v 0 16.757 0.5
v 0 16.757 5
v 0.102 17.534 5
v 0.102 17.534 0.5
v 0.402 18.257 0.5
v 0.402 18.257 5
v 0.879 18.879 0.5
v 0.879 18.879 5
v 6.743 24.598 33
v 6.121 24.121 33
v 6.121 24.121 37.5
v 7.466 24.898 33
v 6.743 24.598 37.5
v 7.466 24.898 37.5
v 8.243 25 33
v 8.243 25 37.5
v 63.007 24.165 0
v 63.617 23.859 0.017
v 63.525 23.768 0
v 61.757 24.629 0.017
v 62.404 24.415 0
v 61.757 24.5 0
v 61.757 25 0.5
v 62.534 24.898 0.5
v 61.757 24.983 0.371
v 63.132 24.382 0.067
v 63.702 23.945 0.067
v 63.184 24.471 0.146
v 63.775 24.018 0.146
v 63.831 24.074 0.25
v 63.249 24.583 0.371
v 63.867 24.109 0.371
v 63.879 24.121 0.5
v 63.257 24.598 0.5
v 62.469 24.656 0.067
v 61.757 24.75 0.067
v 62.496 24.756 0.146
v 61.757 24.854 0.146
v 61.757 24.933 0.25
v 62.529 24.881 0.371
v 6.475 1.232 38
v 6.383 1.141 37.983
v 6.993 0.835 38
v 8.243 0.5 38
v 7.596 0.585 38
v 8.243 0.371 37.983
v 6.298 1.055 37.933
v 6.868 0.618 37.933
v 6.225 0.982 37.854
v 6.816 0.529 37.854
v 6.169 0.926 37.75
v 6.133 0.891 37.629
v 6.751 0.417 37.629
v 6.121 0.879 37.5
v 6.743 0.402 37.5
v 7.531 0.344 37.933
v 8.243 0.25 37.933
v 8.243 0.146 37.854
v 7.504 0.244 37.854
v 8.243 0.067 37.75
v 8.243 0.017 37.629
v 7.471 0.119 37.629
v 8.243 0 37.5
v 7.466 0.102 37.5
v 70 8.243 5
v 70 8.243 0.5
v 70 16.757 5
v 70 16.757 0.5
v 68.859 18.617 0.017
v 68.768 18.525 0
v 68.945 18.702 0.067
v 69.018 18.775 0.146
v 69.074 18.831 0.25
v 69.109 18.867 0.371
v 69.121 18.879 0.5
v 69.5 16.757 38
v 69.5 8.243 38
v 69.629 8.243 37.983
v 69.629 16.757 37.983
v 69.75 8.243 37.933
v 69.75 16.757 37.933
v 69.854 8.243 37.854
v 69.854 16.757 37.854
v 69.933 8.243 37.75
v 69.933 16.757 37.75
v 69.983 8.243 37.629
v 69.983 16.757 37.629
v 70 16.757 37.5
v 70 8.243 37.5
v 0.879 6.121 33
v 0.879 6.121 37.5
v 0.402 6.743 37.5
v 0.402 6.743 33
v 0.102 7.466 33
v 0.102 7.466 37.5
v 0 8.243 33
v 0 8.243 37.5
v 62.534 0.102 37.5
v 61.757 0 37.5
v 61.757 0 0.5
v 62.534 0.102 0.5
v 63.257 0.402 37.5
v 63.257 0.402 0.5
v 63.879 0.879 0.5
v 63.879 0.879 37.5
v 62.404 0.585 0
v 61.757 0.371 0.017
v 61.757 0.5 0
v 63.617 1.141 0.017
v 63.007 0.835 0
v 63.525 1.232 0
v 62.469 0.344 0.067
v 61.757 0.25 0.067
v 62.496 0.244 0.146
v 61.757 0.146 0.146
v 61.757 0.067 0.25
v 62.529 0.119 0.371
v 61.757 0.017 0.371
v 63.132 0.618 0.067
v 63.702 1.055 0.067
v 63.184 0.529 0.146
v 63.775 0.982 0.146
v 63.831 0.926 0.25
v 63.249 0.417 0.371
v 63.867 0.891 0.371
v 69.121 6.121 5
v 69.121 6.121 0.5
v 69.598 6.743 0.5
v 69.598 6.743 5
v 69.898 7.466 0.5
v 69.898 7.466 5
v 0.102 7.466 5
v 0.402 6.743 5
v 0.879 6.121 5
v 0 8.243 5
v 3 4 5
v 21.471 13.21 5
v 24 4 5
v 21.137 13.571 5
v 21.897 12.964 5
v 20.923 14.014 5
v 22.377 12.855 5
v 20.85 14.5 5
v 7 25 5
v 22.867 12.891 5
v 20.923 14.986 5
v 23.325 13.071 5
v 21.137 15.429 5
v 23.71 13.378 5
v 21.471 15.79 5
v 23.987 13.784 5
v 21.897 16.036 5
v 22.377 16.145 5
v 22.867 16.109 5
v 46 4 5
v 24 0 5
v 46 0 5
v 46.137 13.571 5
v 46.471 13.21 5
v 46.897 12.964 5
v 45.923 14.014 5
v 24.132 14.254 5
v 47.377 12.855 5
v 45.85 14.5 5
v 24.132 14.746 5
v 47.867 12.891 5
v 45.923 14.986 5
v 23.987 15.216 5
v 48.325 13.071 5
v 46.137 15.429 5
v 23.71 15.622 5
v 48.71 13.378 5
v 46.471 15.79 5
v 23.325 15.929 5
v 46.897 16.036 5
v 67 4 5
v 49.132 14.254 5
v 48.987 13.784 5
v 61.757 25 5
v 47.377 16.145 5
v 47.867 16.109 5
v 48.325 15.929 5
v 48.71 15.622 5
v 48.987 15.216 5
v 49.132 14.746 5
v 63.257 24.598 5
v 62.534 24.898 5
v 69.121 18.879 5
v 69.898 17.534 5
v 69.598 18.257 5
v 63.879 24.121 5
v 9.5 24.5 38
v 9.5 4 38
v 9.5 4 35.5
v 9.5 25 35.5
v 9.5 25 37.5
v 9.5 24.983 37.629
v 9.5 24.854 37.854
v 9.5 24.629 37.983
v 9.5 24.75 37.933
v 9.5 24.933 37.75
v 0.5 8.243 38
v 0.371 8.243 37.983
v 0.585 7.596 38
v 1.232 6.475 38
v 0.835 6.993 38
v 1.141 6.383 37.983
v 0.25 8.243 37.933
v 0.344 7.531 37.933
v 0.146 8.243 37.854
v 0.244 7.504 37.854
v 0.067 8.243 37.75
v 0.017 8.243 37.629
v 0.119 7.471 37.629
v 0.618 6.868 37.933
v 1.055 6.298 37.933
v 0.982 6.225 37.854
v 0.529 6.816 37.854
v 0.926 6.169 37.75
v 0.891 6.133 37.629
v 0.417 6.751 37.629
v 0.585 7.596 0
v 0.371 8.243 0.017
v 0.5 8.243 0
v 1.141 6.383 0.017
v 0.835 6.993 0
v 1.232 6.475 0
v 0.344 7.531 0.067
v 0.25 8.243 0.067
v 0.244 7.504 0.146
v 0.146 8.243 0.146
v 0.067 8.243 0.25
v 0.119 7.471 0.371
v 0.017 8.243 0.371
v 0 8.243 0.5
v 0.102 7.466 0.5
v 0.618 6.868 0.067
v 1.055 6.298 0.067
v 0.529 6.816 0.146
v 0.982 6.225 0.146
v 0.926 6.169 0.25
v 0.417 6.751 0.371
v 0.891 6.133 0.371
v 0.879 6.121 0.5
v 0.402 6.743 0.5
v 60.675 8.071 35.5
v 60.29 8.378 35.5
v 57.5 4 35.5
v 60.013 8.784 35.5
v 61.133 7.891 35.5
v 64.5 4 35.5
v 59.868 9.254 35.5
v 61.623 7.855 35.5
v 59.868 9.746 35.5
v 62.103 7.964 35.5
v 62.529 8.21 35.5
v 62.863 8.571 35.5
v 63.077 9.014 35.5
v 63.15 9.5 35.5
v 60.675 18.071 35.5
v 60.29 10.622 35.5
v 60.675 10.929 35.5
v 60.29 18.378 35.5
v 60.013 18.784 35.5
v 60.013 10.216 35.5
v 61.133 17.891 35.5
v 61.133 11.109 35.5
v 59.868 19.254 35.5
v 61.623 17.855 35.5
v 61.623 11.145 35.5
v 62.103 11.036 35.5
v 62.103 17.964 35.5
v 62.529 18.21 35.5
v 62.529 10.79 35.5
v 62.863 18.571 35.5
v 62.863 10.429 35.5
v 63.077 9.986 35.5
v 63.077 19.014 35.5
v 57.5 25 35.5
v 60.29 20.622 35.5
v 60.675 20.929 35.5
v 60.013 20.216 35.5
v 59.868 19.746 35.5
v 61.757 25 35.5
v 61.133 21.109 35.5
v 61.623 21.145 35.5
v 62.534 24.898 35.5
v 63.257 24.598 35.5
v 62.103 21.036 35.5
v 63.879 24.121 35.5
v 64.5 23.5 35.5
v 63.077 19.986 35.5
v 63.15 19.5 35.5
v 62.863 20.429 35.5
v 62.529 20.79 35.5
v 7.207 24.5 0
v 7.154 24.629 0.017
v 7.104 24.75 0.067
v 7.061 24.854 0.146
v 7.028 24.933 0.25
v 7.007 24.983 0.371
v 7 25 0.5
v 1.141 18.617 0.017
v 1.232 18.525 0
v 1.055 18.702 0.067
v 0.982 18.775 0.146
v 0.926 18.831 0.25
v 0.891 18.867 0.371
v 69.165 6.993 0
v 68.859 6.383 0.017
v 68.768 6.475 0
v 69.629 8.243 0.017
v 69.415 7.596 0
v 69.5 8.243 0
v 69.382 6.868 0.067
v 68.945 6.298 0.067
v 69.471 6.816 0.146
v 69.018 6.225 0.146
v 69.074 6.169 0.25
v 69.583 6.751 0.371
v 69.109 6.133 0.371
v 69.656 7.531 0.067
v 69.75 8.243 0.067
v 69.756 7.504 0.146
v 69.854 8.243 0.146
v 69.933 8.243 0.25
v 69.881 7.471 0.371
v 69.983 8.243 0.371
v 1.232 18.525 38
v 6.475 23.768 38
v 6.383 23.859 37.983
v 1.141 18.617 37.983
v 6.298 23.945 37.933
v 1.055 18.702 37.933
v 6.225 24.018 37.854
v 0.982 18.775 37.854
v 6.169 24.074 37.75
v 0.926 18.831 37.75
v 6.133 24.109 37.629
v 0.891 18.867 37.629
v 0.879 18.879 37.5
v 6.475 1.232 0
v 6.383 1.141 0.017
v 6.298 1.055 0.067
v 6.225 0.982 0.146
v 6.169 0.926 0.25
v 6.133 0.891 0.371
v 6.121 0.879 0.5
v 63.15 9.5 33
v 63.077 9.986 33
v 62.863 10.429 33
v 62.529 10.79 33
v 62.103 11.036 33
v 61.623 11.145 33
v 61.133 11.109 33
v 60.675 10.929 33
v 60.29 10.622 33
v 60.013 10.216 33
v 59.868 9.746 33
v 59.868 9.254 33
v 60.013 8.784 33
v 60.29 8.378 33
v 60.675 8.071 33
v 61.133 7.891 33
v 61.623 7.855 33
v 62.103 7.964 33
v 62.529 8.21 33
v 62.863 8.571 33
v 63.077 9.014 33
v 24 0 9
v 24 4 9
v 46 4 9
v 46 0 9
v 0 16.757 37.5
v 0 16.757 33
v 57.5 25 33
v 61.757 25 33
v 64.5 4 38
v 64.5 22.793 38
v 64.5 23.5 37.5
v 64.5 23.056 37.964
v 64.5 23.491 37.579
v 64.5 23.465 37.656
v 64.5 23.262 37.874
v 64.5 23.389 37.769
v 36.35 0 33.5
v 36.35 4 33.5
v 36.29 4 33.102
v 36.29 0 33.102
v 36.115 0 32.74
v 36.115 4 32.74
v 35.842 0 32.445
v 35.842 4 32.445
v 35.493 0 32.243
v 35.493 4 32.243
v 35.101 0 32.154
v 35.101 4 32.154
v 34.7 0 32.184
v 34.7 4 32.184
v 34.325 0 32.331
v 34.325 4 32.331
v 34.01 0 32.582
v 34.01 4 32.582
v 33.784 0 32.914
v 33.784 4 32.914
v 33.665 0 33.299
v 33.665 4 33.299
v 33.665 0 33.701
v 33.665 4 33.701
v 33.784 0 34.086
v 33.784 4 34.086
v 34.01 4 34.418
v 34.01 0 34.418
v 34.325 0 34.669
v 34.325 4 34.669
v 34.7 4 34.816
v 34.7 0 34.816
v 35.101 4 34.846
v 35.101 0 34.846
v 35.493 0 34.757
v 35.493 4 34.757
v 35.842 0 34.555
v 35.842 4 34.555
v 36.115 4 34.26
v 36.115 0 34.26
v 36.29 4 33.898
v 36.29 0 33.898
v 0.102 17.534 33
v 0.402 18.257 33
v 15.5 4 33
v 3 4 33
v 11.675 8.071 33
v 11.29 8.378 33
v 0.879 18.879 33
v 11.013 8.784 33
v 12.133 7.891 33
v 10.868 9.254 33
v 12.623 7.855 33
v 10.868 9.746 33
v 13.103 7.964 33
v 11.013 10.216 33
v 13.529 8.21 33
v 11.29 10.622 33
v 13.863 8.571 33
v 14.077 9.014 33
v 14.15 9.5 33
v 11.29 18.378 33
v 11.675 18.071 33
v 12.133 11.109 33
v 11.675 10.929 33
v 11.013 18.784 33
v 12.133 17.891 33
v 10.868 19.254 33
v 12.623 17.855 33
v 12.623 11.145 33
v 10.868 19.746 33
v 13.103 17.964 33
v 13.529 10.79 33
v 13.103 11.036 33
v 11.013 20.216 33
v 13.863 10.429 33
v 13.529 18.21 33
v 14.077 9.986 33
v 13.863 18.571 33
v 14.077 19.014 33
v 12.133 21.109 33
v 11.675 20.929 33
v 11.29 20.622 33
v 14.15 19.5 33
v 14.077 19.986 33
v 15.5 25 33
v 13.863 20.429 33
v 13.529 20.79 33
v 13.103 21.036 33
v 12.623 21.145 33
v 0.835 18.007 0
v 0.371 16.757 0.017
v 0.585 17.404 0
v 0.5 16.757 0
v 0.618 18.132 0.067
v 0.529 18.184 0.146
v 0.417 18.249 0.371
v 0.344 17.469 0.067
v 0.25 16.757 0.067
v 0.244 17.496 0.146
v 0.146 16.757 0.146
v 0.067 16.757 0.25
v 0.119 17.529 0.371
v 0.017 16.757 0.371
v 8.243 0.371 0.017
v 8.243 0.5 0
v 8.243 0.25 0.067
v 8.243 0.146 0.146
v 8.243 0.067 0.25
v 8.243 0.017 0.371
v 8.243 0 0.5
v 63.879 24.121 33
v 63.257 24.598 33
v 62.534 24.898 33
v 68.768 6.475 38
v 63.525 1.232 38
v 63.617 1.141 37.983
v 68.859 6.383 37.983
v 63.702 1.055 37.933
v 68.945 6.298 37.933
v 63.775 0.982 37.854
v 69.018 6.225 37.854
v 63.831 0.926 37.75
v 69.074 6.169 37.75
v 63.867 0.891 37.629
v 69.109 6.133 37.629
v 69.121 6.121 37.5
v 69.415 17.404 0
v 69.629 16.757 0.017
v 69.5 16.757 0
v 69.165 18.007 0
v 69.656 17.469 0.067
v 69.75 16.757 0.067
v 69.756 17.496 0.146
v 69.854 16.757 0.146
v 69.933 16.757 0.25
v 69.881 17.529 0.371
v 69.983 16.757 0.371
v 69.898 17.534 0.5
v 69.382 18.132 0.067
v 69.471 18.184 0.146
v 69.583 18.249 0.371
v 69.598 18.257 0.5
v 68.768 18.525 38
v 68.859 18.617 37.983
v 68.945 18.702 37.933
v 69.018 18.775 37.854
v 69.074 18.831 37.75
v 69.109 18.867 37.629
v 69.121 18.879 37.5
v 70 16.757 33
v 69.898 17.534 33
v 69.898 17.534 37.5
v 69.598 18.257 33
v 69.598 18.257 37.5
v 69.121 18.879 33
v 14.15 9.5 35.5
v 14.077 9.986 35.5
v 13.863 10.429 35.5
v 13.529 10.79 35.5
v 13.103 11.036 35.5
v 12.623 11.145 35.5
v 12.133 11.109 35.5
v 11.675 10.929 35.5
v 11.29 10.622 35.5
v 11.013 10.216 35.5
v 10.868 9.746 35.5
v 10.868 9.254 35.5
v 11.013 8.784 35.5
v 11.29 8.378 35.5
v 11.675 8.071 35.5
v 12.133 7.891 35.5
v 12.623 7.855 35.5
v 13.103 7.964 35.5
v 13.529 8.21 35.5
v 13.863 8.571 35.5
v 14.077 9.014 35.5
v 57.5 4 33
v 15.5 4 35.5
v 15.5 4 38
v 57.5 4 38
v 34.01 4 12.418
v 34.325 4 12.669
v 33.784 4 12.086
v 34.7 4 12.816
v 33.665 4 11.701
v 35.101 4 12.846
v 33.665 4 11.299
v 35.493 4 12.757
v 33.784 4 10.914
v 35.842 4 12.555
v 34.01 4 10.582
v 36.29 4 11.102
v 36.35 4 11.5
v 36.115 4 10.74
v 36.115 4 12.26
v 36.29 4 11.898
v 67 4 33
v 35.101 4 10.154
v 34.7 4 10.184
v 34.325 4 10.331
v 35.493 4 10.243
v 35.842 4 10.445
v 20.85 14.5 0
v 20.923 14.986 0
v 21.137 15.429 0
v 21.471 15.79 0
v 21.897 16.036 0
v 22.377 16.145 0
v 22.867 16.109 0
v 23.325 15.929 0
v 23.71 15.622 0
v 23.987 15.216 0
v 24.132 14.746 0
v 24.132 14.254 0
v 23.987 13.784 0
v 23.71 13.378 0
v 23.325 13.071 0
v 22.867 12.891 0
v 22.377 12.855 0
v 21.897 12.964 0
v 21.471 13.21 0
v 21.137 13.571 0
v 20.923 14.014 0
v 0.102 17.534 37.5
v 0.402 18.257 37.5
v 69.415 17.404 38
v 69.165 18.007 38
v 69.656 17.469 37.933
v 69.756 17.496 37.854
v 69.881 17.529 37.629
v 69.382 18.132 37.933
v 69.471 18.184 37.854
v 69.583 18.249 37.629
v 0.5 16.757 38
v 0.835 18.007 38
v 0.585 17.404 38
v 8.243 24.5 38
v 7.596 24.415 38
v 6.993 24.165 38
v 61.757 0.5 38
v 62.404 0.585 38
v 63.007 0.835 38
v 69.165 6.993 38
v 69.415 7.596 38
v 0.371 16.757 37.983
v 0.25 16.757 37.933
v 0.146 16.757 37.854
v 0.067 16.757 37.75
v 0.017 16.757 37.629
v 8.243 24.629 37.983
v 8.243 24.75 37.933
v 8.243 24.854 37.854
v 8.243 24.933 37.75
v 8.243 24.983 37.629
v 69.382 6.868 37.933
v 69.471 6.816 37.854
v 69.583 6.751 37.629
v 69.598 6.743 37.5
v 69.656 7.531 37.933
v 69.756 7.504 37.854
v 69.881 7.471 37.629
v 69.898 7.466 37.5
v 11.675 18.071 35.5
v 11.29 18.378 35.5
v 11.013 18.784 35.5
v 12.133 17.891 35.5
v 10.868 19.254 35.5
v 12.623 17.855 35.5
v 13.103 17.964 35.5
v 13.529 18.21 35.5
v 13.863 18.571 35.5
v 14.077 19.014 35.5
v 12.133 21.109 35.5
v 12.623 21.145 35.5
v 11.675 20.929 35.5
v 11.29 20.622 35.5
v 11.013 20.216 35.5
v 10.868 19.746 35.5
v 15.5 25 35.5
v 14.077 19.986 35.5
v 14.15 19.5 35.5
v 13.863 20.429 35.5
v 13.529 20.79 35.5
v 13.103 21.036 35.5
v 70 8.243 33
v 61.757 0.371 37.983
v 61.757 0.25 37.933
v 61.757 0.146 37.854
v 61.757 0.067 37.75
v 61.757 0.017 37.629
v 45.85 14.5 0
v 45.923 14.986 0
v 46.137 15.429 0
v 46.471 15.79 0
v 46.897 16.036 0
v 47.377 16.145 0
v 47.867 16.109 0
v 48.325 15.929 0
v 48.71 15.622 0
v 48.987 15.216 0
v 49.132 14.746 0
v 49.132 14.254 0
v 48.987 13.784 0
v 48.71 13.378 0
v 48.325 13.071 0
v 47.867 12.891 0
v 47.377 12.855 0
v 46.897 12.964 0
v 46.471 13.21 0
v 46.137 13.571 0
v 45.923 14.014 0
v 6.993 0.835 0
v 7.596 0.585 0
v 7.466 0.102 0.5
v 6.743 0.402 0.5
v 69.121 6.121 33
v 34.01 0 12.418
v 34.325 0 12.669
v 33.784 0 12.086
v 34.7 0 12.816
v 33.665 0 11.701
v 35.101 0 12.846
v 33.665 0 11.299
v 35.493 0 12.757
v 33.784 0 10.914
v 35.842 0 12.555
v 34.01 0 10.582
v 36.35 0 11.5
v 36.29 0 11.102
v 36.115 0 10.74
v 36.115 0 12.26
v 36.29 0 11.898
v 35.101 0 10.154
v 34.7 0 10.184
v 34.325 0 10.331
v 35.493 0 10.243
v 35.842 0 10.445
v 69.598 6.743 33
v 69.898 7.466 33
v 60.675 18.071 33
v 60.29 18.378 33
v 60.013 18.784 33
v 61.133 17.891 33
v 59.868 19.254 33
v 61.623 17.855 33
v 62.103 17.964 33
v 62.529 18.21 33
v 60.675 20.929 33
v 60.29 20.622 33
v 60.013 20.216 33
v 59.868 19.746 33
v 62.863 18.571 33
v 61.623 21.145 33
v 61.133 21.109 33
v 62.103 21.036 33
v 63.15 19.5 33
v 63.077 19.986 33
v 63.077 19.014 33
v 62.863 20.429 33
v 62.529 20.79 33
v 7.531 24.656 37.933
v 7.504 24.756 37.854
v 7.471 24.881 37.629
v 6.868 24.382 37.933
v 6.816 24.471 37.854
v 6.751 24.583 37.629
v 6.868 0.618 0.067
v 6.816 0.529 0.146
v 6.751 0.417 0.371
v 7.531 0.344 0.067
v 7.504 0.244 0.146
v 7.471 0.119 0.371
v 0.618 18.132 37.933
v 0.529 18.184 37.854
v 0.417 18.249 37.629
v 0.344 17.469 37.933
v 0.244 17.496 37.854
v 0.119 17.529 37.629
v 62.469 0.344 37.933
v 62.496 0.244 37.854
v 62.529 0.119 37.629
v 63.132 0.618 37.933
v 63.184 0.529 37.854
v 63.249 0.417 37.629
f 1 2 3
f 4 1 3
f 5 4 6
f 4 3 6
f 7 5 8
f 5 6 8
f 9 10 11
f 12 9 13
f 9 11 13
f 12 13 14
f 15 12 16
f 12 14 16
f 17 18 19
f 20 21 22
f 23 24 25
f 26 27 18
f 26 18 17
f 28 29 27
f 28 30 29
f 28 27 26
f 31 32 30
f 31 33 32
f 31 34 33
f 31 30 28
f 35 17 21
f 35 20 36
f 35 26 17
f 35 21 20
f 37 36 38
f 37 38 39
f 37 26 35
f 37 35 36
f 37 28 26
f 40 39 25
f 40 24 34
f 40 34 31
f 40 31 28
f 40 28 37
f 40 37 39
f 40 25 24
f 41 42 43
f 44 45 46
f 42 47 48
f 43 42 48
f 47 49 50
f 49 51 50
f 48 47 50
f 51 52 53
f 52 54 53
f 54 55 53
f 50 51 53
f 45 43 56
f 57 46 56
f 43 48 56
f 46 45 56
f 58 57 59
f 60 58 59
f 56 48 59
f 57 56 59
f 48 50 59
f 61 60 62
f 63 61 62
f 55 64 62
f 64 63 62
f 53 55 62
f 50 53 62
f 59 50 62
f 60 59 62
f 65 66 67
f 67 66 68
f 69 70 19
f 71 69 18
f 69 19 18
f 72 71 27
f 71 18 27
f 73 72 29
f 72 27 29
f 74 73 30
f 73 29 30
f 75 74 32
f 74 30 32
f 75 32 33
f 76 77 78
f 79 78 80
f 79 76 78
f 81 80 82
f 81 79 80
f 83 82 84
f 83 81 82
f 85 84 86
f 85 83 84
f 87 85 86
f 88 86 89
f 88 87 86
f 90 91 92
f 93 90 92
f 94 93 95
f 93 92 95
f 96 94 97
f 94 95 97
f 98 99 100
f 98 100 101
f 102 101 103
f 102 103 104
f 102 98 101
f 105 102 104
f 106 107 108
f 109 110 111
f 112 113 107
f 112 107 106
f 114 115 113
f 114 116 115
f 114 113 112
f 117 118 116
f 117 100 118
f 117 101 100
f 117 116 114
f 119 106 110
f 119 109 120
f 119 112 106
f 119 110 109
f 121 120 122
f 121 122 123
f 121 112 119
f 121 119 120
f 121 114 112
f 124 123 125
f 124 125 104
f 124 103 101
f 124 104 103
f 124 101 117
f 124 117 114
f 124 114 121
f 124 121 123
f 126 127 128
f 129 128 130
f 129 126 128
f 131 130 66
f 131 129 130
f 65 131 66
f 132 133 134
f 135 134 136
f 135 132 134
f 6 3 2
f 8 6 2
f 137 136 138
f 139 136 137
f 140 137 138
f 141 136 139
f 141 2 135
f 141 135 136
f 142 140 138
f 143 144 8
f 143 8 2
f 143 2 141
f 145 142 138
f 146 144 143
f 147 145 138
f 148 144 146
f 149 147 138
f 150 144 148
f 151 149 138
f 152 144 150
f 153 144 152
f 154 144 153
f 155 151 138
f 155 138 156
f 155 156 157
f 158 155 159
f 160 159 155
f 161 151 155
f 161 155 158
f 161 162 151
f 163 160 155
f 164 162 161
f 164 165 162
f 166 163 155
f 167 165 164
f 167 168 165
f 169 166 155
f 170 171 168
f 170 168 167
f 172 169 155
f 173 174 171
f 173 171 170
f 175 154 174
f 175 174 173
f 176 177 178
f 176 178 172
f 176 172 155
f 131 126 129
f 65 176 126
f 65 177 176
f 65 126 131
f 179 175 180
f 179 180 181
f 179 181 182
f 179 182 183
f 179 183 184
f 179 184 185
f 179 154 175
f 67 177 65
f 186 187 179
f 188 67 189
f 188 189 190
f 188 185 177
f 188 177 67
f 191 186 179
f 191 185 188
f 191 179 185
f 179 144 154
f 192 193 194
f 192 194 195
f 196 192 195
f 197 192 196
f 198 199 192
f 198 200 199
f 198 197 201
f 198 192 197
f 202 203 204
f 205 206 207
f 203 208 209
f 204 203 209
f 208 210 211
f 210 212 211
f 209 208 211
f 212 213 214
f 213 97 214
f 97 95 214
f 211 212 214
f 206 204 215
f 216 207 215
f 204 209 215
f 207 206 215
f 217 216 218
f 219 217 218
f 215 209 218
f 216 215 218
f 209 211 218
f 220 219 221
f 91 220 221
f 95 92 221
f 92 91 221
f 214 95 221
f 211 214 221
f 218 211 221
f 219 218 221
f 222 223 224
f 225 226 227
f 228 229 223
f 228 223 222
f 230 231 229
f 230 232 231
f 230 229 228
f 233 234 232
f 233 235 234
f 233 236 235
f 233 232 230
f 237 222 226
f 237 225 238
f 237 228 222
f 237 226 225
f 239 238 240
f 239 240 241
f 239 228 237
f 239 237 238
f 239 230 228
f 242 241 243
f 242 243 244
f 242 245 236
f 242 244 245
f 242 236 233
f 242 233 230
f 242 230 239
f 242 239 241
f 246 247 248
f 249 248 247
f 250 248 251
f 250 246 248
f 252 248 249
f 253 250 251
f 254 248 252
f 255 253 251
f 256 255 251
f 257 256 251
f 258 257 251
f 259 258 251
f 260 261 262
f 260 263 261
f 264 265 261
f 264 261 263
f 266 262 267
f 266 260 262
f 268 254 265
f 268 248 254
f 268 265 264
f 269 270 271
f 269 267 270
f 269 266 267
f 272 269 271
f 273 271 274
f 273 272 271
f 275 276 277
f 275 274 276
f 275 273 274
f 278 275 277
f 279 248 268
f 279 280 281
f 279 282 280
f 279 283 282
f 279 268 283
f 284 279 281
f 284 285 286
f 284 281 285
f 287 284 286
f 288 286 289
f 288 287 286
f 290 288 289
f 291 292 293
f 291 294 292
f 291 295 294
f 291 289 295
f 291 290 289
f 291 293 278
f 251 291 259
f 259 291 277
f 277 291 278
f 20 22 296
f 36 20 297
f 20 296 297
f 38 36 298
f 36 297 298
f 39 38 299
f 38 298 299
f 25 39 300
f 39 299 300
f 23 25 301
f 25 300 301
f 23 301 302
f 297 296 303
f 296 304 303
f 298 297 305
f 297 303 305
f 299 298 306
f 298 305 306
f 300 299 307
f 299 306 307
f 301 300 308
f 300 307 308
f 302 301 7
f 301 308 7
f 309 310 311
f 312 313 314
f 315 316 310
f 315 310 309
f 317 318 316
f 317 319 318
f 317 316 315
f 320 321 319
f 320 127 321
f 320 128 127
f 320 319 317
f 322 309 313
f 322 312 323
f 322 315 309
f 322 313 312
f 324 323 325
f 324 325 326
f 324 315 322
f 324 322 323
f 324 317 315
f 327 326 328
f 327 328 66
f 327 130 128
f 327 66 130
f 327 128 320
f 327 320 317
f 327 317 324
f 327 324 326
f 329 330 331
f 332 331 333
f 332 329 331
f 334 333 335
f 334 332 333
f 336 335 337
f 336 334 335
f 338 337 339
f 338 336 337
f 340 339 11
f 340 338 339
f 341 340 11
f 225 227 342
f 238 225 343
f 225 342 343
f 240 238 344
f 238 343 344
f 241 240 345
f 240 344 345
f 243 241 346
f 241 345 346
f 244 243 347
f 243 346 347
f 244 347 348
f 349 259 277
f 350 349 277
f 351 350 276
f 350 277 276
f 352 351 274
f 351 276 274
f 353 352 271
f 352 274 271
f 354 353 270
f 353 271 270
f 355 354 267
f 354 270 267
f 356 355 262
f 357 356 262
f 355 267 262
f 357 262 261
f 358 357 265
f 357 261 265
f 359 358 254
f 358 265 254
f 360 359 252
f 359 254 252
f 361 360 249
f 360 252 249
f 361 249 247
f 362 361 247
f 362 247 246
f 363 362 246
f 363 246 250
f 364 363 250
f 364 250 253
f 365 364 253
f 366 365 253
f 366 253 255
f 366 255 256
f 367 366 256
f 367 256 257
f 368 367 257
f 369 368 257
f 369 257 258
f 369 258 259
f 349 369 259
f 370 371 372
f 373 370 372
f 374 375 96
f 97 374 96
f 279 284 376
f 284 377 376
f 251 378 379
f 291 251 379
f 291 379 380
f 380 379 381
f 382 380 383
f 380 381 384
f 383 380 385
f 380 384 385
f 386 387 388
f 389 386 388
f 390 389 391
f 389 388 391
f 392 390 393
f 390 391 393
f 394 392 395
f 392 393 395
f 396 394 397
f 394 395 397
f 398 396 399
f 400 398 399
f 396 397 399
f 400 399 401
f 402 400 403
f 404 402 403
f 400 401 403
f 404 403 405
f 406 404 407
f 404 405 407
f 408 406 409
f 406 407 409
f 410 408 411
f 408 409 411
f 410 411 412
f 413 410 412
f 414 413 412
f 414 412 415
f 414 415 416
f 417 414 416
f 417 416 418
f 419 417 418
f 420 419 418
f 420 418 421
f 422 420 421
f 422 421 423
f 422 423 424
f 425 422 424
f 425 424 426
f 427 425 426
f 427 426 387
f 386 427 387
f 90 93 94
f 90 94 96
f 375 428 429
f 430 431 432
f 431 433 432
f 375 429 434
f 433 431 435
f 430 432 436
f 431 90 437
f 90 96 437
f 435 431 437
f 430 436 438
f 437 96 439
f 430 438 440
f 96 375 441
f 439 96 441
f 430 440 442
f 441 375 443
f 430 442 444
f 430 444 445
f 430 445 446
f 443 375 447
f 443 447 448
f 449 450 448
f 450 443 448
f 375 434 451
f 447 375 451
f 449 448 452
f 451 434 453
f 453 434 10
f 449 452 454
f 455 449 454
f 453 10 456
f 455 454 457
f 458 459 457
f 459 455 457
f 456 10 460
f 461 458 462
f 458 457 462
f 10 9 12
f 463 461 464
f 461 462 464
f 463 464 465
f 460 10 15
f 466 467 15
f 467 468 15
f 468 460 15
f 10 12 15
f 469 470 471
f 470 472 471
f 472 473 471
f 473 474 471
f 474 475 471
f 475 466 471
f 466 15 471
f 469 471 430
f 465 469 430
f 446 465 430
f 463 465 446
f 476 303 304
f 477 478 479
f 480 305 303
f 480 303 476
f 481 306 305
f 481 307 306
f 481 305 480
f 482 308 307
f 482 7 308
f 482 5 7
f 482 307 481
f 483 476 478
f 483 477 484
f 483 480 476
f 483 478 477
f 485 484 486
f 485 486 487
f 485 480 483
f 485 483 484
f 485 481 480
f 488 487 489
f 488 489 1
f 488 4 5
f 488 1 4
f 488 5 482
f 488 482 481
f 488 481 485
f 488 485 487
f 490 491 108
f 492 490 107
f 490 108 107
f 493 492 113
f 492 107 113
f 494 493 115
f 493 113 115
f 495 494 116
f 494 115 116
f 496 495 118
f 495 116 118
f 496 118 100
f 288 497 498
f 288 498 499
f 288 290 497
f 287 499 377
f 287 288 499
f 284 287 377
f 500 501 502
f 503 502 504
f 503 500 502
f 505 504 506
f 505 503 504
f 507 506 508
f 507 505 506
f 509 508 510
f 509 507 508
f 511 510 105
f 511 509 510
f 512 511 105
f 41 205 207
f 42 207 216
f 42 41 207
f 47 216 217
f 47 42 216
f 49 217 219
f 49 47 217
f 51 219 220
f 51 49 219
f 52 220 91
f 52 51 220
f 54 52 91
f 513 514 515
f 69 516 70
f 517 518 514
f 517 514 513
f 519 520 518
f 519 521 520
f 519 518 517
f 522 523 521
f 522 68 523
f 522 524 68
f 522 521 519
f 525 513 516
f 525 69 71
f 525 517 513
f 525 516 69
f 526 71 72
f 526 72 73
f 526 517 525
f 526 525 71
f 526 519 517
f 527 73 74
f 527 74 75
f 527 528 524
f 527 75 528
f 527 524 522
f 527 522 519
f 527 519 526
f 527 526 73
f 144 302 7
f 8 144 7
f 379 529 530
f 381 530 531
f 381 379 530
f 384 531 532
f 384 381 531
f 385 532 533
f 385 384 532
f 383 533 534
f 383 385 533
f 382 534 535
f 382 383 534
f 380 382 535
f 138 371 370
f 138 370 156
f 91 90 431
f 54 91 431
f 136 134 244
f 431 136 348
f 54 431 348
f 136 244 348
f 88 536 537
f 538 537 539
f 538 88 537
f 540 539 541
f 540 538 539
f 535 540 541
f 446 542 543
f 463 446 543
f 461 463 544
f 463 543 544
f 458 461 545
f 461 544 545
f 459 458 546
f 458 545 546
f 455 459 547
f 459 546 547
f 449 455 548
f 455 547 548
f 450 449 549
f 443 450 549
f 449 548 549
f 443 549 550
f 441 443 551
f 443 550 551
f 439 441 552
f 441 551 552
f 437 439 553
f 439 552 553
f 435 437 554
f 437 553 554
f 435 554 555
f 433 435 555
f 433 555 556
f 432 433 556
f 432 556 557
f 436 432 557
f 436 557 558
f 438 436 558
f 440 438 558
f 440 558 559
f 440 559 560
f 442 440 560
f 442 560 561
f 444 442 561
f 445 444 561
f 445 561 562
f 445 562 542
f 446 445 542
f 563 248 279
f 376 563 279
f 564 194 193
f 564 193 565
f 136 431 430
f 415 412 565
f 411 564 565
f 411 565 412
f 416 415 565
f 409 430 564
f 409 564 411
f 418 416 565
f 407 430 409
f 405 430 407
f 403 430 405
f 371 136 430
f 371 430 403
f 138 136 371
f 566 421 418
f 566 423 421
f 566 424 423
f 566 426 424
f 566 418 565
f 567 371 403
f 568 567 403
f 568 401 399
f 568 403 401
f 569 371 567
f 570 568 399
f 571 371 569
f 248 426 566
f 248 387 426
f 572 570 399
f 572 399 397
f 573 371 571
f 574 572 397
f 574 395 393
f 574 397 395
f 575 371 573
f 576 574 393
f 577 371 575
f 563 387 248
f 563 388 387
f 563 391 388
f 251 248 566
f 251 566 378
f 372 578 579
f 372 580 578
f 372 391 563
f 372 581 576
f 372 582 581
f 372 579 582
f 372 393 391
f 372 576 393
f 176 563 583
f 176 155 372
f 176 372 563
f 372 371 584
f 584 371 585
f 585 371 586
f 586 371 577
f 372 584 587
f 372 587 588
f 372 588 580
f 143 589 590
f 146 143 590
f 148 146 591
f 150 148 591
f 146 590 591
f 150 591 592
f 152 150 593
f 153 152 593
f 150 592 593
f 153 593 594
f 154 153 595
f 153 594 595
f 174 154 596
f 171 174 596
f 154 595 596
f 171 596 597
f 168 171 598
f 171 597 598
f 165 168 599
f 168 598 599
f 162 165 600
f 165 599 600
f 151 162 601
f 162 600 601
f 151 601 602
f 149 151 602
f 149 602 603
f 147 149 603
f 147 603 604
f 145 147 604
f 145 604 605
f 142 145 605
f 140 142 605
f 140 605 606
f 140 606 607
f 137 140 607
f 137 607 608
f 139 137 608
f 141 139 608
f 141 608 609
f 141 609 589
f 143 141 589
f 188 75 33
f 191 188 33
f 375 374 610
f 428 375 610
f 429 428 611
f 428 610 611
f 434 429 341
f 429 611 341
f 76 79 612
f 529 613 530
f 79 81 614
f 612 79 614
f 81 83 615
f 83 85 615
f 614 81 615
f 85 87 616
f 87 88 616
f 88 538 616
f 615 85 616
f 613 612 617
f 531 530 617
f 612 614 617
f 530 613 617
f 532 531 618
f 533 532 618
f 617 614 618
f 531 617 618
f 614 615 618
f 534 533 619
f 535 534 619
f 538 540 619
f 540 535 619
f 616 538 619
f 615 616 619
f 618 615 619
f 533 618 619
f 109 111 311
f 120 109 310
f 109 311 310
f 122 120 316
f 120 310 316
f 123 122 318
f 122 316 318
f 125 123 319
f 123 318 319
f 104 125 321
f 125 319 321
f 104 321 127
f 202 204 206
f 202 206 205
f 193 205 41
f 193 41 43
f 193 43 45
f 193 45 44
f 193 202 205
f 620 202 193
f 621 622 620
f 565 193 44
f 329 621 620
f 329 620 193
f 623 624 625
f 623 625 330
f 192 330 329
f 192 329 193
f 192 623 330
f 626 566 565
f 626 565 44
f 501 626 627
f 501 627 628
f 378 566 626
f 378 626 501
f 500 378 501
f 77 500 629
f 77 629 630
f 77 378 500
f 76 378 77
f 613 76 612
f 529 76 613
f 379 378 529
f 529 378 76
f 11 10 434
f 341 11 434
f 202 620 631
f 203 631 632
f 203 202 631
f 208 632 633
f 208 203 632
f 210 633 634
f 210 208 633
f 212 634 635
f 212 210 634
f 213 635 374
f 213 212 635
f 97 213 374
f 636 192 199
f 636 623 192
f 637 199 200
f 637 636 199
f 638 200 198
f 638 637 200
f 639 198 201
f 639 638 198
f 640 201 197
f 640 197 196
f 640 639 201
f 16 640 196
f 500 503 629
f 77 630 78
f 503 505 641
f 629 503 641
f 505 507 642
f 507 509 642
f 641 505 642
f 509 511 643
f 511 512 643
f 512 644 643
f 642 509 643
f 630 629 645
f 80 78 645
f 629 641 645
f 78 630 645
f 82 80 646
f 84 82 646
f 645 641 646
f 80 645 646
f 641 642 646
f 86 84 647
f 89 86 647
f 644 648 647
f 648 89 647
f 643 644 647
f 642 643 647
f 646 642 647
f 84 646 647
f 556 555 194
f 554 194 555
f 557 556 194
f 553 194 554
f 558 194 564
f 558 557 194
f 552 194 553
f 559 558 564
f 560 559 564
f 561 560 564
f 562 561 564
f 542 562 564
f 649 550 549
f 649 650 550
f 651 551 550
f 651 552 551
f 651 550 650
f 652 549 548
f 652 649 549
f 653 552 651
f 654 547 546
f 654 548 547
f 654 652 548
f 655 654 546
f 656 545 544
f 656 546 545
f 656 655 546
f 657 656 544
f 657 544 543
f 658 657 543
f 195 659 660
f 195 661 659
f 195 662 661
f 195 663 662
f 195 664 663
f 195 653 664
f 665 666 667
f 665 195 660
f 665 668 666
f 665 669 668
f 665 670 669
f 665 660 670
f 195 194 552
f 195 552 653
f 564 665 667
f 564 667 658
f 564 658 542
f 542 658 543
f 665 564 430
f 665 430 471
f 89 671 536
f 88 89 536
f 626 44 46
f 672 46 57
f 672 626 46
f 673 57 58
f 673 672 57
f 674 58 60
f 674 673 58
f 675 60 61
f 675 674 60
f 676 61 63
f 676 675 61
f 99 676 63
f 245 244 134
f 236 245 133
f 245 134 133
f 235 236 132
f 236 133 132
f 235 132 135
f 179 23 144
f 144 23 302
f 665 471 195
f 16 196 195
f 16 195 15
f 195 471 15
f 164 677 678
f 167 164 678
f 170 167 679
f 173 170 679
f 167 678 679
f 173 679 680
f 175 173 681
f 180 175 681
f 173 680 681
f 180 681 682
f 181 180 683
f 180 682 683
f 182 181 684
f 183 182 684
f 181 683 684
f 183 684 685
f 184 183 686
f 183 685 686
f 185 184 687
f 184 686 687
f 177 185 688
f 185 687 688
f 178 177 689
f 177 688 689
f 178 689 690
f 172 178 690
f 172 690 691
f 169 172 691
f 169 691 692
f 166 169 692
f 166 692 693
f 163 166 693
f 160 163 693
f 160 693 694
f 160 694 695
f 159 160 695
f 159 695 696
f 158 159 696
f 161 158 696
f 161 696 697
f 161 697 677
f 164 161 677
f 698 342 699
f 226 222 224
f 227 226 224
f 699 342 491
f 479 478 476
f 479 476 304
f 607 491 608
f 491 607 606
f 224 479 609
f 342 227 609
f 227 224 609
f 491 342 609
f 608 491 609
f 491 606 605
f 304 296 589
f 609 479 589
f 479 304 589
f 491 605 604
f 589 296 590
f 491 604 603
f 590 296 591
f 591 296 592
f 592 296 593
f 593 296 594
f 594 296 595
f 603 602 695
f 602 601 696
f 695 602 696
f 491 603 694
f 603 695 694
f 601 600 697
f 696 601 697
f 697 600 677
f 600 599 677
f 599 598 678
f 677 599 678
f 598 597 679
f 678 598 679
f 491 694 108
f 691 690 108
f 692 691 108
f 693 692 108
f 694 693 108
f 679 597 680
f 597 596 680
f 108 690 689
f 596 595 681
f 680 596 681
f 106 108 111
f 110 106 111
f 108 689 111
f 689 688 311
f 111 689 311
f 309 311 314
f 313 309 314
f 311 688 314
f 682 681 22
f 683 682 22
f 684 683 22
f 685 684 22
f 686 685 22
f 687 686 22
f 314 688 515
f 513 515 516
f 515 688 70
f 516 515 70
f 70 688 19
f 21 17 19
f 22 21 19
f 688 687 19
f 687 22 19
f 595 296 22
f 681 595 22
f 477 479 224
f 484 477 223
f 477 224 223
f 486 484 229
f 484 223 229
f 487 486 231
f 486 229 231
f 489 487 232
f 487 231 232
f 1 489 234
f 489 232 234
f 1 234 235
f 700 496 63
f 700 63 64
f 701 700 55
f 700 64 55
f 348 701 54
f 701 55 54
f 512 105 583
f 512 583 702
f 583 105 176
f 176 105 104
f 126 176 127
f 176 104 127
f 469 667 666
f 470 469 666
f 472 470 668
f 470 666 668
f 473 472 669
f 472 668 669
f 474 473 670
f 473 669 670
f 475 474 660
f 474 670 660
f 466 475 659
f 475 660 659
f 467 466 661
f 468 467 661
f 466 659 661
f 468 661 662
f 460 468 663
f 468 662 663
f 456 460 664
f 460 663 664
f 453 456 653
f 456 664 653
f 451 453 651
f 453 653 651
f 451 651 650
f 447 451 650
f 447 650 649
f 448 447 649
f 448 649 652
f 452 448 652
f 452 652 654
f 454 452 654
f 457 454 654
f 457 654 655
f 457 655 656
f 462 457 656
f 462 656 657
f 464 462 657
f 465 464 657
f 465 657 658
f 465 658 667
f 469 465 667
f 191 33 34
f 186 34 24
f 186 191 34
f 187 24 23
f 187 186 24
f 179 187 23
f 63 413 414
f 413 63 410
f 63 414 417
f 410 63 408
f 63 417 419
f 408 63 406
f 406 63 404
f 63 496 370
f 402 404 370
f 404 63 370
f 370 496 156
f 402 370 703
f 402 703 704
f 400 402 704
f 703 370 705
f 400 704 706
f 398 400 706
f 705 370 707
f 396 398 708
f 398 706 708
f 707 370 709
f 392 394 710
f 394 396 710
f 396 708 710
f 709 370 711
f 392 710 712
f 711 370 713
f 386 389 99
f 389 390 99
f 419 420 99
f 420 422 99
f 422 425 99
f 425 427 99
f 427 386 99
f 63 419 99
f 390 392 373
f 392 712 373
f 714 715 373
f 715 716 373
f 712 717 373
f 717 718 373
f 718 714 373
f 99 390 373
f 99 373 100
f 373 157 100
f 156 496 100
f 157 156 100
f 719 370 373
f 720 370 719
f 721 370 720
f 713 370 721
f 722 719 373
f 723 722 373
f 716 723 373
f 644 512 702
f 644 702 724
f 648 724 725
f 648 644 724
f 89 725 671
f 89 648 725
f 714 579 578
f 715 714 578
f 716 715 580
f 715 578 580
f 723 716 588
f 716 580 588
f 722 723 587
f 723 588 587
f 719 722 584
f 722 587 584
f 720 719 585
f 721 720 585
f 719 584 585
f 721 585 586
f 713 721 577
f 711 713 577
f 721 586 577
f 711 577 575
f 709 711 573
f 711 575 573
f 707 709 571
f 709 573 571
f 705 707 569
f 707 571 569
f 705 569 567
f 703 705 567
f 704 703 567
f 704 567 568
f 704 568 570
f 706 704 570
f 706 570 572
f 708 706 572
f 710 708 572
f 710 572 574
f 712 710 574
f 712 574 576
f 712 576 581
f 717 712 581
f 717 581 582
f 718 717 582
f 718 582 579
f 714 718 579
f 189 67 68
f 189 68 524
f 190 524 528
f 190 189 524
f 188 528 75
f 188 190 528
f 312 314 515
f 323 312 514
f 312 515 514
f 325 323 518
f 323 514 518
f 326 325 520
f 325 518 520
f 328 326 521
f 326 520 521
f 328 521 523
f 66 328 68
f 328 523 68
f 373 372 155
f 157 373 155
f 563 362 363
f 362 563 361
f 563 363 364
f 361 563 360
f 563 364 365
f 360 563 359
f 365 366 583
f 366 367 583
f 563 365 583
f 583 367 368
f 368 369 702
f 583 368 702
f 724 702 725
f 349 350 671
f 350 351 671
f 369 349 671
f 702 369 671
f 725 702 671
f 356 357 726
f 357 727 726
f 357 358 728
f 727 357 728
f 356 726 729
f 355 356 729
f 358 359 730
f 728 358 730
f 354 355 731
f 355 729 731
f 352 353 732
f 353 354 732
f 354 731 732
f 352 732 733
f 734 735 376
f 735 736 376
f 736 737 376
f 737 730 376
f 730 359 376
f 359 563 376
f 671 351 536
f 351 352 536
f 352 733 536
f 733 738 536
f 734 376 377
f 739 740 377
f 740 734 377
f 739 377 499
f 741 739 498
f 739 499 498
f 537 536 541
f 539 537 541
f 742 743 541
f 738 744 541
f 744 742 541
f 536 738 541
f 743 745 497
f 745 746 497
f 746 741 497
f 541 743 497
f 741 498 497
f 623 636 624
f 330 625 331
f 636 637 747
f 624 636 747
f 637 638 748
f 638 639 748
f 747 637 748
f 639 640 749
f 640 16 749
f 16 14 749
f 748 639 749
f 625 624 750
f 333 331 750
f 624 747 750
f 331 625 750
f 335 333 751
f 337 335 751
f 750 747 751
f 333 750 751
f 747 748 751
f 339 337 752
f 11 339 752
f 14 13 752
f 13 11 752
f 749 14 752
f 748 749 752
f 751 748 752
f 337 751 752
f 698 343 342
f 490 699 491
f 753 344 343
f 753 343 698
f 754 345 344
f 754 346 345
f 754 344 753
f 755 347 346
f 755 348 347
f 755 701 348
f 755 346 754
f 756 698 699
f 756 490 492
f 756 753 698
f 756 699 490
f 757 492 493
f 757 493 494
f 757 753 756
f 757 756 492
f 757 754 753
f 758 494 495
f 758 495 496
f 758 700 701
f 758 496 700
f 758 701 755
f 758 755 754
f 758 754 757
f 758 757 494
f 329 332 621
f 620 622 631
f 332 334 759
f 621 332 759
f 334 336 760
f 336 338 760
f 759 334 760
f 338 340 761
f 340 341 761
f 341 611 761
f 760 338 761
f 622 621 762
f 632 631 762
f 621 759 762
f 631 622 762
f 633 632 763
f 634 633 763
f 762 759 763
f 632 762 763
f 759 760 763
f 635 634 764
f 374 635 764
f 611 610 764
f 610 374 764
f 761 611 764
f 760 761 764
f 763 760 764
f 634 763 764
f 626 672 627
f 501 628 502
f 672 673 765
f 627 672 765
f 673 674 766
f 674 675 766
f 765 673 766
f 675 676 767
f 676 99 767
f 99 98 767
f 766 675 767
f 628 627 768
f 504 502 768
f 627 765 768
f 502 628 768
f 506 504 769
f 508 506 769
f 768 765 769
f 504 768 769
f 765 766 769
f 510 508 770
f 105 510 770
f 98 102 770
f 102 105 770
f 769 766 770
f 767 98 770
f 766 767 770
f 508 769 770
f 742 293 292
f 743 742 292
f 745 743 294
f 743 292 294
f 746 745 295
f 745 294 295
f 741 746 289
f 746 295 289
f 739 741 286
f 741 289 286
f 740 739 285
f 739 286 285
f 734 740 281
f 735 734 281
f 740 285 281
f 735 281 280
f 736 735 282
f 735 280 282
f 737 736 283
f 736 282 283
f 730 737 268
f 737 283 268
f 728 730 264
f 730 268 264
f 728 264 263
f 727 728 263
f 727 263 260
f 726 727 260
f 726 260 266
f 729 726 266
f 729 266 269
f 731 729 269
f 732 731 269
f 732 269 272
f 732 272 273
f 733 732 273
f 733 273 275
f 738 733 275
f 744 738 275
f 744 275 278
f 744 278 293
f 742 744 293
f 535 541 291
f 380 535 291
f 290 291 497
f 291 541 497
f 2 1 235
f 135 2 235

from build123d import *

# Parameters (mm, degrees)
EXTRUDE_1_DEPTH     = 38
SKETCH_2_W          = 70
SKETCH_2_H          = 28
CUT_EXTRUDE_1_DEPTH = 21
SKETCH_3_R          = 1.65
SKETCH_3_W          = 42
SKETCH_3_H          = 21
CUT_EXTRUDE_2_DEPTH = 20
SKETCH_5_R          = 1.65
CUT_EXTRUDE_3_DEPTH = 10
SKETCH_7_W          = 55
SKETCH_7_H          = 25.515470347
CUT_EXTRUDE_4_DEPTH = 2.5
FILLET_1_R          = 3
FILLET_2_R          = 0.5
SKETCH_8_R          = 1.35
SKETCH_8_W          = 22
SKETCH_8_H          = 4
CUT_EXTRUDE_5_DEPTH = 5


with BuildPart() as part:
    # 草图1 → 凸台-拉伸1 (new body)
    with BuildSketch(Plane.XY):
        Polygon((7, 0), (63, 0), (70, 7), (70, 18), (63, 25), (7, 25), (0, 18), (0, 7), align=None)
    extrude(amount=EXTRUDE_1_DEPTH)

    # 草图2 → 切除-拉伸1 (cut)
    with BuildSketch(Plane(origin=(0, 25, 0), x_dir=(1, 0, 0), z_dir=(0, 1, 0))):
        with Locations((35, -19)):
            Rectangle(SKETCH_2_W, SKETCH_2_H)
    extrude(amount=-CUT_EXTRUDE_1_DEPTH, mode=Mode.SUBTRACT)

    # 草图3 → 切除-拉伸2 (cut)
    with BuildSketch(Plane.XY.offset(38)):
        with Locations((12.5, 19.5)):
            Circle(SKETCH_3_R)
        with Locations((12.5, 9.5)):
            Circle(SKETCH_3_R)
        with Locations((61.5, 19.5)):
            Circle(SKETCH_3_R)
        with Locations((61.5, 9.5)):
            Circle(SKETCH_3_R)
        with Locations((36.5, 14.5)):
            Rectangle(SKETCH_3_W, SKETCH_3_H)
    extrude(amount=-CUT_EXTRUDE_2_DEPTH, mode=Mode.SUBTRACT)

    # 草图5 → 切除-拉伸3 (cut)
    with BuildSketch(Plane(origin=(0, 0, 0), x_dir=(-1, 0, 0), z_dir=(0, 0, -1))):
        with Locations((-22.5, 14.5)):
            Circle(SKETCH_5_R)
        with Locations((-47.5, 14.5)):
            Circle(SKETCH_5_R)
    extrude(amount=-CUT_EXTRUDE_3_DEPTH, mode=Mode.SUBTRACT)

    # 草图7 → 切除-拉伸4 (cut)
    with BuildSketch(Plane.XY.offset(38)):
        with Locations((37, 16.757735174)):
            Rectangle(SKETCH_7_W, SKETCH_7_H)
    extrude(amount=-CUT_EXTRUDE_4_DEPTH, mode=Mode.SUBTRACT)

    # 圆角1
    fillet_1_edges = [part.edges().sort_by_distance(p)[0] for p in [
        (63, 25, 34.25),
        (0, 7, 35.5),
        (0, 18, 35.5),
        (7, 25, 35.5),
        (70, 18, 35.5),
        (70, 7, 35.5),
        (63, 0, 19),
        (7, 0, 19),
        (0, 7, 2.5),
        (0, 18, 2.5),
        (63, 25, 2.5),
        (70, 18, 2.5),
        (70, 7, 2.5),
    ]]
    fillet(fillet_1_edges, radius=FILLET_1_R)

    # 圆角2
    fillet_2_edges = [part.edges().sort_by_distance(p)[0] for p in [
        (8.871320344, 25, 38),
        (66.810660172, 21.189339828, 38),
        (34.378679656, 25, 0),
        (3.5, 3.5, 0),
        (0, 12.5, 0),
        (66.5, 21.5, 0),
        (70, 12.5, 0),
        (66.5, 3.5, 0),
        (35, 0, 0),
        (7.09459039, 0.228361402, 0),
        (0.228361402, 7.09459039, 0),
        (0.228361402, 17.90540961, 0),
        (62.90540961, 0.228361402, 0),
        (69.771638598, 7.09459039, 0),
        (69.771638598, 17.90540961, 0),
        (62.90540961, 24.771638598, 0),
        (70, 12.5, 38),
        (3.5, 21.5, 38),
        (0, 12.5, 38),
        (3.5, 3.5, 38),
        (35, 0, 38),
        (66.5, 3.5, 38),
        (7.09459039, 0.228361402, 38),
        (0.228361402, 7.09459039, 38),
        (0.228361402, 17.90540961, 38),
        (7.09459039, 24.771638598, 38),
        (62.90540961, 0.228361402, 38),
        (69.771638598, 7.09459039, 38),
        (69.771638598, 17.90540961, 38),
        (3.939339828, 21.939339828, 0),
    ]]
    fillet(fillet_2_edges, radius=FILLET_2_R)

    # 草图8 → 切除-拉伸5 (cut, through all)
    with BuildSketch(Plane(origin=(0, 4, 0), x_dir=(1, 0, 0), z_dir=(0, 1, 0))):
        with Locations((35, -11.5)):
            Circle(SKETCH_8_R)
        with Locations((35, -33.5)):
            Circle(SKETCH_8_R)
        with Locations((35, -7)):
            Rectangle(SKETCH_8_W, SKETCH_8_H)
    extrude(amount=-CUT_EXTRUDE_5_DEPTH, mode=Mode.SUBTRACT)


solid = part.part
